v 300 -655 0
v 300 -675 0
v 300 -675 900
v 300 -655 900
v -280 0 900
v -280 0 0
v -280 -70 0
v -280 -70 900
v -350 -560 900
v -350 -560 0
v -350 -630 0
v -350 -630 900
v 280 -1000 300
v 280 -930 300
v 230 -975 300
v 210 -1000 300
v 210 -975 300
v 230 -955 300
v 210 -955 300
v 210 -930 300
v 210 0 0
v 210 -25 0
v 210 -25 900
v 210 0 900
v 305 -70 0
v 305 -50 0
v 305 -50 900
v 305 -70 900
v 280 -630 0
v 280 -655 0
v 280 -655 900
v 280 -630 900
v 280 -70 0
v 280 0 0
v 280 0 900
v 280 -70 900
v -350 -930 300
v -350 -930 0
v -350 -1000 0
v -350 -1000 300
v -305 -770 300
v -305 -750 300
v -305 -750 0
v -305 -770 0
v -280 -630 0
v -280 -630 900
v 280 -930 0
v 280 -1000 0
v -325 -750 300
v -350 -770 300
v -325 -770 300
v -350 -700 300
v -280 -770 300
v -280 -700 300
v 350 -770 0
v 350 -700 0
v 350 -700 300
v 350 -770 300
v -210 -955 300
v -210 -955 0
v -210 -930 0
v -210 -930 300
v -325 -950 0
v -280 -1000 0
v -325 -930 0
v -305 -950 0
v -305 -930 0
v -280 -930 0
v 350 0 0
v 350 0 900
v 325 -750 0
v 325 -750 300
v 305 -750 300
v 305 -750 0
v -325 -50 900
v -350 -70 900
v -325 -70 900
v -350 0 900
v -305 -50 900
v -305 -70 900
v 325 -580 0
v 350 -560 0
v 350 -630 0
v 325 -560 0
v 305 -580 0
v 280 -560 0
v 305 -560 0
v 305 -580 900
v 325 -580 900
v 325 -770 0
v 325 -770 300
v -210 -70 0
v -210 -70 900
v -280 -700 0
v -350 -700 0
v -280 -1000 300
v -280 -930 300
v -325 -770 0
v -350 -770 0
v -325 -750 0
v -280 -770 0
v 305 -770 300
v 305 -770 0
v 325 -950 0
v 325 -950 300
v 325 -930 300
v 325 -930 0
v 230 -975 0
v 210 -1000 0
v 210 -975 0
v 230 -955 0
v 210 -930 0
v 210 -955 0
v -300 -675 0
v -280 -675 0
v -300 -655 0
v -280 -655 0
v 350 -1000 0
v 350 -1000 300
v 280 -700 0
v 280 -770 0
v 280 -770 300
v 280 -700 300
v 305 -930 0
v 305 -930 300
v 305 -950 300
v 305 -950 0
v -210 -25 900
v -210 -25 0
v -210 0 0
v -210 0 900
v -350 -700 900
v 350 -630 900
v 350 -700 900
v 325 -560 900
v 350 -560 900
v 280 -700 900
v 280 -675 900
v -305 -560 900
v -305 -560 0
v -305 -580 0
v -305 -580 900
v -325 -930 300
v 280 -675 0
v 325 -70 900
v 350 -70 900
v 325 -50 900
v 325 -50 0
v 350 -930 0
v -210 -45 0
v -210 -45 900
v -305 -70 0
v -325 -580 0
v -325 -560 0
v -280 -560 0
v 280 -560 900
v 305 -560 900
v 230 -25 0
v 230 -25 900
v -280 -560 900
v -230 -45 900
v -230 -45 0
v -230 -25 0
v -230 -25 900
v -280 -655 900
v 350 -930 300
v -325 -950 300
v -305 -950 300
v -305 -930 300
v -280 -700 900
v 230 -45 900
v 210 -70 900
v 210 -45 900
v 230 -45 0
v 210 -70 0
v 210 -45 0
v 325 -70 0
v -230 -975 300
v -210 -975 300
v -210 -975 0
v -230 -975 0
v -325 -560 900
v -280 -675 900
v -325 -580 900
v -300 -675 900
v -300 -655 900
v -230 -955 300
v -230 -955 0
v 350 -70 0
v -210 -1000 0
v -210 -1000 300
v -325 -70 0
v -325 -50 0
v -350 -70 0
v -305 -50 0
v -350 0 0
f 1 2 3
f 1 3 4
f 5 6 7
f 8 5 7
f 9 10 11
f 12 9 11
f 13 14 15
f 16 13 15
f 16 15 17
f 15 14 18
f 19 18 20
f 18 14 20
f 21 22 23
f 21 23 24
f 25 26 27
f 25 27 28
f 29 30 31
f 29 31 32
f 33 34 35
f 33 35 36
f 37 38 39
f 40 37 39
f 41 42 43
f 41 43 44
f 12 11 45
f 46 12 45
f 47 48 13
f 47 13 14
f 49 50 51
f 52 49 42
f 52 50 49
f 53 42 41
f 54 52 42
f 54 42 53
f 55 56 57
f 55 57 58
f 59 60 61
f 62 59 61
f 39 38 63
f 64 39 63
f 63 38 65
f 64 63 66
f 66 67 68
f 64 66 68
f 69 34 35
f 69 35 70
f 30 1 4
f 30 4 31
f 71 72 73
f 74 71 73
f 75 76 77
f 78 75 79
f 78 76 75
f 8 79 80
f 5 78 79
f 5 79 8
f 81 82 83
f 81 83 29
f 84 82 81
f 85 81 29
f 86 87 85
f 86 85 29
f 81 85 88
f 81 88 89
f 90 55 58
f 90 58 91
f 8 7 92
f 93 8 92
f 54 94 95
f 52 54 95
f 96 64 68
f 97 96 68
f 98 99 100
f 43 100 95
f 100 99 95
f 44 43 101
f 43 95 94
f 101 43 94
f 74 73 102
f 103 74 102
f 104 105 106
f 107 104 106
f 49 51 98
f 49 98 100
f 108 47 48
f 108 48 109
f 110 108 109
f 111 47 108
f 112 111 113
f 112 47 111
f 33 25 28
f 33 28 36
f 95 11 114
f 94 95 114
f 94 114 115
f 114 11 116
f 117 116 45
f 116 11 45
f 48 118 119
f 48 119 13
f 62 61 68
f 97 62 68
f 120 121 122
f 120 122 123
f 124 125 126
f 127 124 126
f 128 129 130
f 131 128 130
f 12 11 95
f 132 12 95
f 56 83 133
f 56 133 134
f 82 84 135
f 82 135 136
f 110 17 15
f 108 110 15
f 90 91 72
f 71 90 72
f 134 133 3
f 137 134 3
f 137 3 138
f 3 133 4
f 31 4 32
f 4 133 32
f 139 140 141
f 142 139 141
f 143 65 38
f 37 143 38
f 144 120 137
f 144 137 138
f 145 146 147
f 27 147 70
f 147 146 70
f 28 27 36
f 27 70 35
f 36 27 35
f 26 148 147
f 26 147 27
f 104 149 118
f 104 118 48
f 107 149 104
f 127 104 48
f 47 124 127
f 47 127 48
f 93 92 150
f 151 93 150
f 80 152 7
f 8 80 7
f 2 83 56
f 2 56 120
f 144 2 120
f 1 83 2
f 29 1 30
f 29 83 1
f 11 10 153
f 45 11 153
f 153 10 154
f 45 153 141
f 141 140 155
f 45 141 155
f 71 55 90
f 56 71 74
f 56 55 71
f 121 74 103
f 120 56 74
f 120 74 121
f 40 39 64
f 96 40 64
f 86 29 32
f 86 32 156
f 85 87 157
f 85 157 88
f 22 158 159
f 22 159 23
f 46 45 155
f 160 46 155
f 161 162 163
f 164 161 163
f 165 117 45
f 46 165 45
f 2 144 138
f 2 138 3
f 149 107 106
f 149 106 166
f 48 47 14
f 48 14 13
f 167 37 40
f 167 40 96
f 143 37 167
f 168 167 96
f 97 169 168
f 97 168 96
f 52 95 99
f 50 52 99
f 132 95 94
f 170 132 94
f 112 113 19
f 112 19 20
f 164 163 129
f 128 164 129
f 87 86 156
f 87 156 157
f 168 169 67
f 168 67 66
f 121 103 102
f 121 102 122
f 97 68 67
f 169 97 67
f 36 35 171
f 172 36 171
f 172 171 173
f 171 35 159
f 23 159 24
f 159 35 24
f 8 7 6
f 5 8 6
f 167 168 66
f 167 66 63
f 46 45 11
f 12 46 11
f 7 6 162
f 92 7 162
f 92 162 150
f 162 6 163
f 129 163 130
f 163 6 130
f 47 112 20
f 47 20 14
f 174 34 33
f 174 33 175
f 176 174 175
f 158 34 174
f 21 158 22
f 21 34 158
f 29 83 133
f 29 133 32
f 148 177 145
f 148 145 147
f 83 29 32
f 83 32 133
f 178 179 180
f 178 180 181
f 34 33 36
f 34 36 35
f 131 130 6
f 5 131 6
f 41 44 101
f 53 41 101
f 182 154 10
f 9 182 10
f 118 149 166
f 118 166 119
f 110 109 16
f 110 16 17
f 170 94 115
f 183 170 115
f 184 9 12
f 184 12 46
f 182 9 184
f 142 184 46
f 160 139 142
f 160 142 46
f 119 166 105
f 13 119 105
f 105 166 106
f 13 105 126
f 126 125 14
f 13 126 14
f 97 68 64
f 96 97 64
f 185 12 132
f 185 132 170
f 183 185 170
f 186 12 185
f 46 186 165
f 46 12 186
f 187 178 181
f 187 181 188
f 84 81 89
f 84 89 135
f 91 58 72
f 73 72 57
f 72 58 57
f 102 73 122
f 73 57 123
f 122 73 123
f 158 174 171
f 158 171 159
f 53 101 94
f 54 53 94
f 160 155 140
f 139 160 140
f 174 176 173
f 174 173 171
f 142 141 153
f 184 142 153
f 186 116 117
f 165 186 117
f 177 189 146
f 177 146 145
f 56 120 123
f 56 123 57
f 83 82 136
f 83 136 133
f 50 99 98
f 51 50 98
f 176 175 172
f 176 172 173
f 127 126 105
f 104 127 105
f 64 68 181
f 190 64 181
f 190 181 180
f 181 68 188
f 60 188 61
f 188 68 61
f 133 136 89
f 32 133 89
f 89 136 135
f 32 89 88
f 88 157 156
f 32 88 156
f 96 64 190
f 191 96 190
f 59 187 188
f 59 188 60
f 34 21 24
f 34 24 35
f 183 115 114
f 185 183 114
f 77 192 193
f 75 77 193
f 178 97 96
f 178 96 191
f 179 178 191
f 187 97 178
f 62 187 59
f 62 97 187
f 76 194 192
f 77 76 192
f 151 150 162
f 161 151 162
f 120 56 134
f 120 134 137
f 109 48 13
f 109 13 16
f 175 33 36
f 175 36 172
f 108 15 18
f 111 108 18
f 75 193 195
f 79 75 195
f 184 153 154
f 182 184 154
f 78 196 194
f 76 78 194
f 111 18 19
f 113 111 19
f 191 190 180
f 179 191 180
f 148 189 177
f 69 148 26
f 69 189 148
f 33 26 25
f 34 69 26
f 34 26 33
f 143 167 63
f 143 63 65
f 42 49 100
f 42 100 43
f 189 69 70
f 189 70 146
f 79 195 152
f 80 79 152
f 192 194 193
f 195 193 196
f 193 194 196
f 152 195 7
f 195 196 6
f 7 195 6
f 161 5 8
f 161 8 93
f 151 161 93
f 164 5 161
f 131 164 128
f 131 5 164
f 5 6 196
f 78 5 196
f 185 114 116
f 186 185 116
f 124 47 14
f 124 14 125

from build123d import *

# Parameters (mm, degrees)
F1_DEPTH = 900
F2_DEPTH = 900
F3_DEPTH = 900
F4_DEPTH = 900
F5_DEPTH = 300
F6_DEPTH = 300
F7_DEPTH = 300


with BuildPart() as f1:
    # F0 (on Top) → F1 (new body)
    with BuildSketch(Plane.XY):
        Polygon((-280, 0), (-350, 0), (-350, -70), (-325, -70), (-325, -50), (-305, -50), (-305, -70), (-280, -70), align=None)
    extrude(amount=F1_DEPTH)


with BuildPart() as f2:
    # F0 (on Top) → F2 (new body, through all)
    with BuildSketch(Plane.XY):
        Polygon((-210, 0), (-280, 0), (-280, -70), (-210, -70), (-210, -45), (-230, -45), (-230, -25), (-210, -25), align=None)
    extrude(amount=F2_DEPTH)


with BuildPart() as f3:
    # F0 (on Top) → F3 (new body, through all)
    with BuildSketch(Plane.XY):
        Polygon((-325, -630), (-350, -630), (-350, -700), (-280, -700), (-280, -630), (-305, -630), (-305, -650), (-325, -650), align=None)
    extrude(amount=F3_DEPTH)


with BuildPart() as f4:
    # F0 (on Top) → F4 (new body, through all)
    with BuildSketch(Plane.XY):
        Polygon((-280, -630), (-280, -700), (-210, -700), (-210, -675), (-230, -675), (-230, -655), (-210, -655), (-210, -630), align=None)
    extrude(amount=F4_DEPTH)


with BuildPart() as f5:
    # F0 (on Top) → F5 (new body)
    with BuildSketch(Plane.XY):
        Polygon((-280, -700), (-350, -700), (-350, -770), (-325, -770), (-325, -750), (-305, -750), (-305, -770), (-280, -770), align=None)
    extrude(amount=F5_DEPTH)


with BuildPart() as f6:
    # F0 (on Top) → F6 (new body, through all)
    with BuildSketch(Plane.XY):
        Polygon((-325, -930), (-350, -930), (-350, -1000), (-280, -1000), (-280, -930), (-305, -930), (-305, -950), (-325, -950), align=None)
    extrude(amount=F6_DEPTH)


with BuildPart() as f7:
    # F0 (on Top) → F7 (new body, through all)
    with BuildSketch(Plane.XY):
        Polygon((-280, -930), (-280, -1000), (-210, -1000), (-210, -975), (-230, -975), (-230, -955), (-210, -955), (-210, -930), align=None)
    extrude(amount=F7_DEPTH)


with BuildPart() as f8_1:
    # F8: instance of F1
    add(f1.part.mirror(Plane.YZ))


with BuildPart() as f8_2:
    # F8: instance of F2
    add(f2.part.mirror(Plane.YZ))


with BuildPart() as f8_3:
    # F8: instance of F3
    add(f3.part.mirror(Plane.YZ))


with BuildPart() as f8_4:
    # F8: instance of F4
    add(f4.part.mirror(Plane.YZ))


with BuildPart() as f8_5:
    # F8: instance of F5
    add(f5.part.mirror(Plane.YZ))


with BuildPart() as f8_6:
    # F8: instance of F6
    add(f6.part.mirror(Plane.YZ))


with BuildPart() as f8_7:
    # F8: instance of F7
    add(f7.part.mirror(Plane.YZ))


with BuildPart() as f3_1:
    # F9: moved
    add(f3.part.moved(Location((0, 70, 0))))


with BuildPart() as f8_3_1:
    # F9: moved
    add(f8_3.part.moved(Location((0, 70, 0))))


with BuildPart() as f4_1:
    # F10: moved
    add(f4.part.moved(Location((-70, 0, 0))))


with BuildPart() as f8_4_1:
    # F11: moved
    add(f8_4.part.moved(Location((70, 0, 0))))


solid = Compound([f1.part, f2.part, f5.part, f6.part, f7.part, f8_1.part, f8_2.part, f8_5.part, f8_6.part, f8_7.part, f3_1.part, f8_3_1.part, f4_1.part, f8_4_1.part])
